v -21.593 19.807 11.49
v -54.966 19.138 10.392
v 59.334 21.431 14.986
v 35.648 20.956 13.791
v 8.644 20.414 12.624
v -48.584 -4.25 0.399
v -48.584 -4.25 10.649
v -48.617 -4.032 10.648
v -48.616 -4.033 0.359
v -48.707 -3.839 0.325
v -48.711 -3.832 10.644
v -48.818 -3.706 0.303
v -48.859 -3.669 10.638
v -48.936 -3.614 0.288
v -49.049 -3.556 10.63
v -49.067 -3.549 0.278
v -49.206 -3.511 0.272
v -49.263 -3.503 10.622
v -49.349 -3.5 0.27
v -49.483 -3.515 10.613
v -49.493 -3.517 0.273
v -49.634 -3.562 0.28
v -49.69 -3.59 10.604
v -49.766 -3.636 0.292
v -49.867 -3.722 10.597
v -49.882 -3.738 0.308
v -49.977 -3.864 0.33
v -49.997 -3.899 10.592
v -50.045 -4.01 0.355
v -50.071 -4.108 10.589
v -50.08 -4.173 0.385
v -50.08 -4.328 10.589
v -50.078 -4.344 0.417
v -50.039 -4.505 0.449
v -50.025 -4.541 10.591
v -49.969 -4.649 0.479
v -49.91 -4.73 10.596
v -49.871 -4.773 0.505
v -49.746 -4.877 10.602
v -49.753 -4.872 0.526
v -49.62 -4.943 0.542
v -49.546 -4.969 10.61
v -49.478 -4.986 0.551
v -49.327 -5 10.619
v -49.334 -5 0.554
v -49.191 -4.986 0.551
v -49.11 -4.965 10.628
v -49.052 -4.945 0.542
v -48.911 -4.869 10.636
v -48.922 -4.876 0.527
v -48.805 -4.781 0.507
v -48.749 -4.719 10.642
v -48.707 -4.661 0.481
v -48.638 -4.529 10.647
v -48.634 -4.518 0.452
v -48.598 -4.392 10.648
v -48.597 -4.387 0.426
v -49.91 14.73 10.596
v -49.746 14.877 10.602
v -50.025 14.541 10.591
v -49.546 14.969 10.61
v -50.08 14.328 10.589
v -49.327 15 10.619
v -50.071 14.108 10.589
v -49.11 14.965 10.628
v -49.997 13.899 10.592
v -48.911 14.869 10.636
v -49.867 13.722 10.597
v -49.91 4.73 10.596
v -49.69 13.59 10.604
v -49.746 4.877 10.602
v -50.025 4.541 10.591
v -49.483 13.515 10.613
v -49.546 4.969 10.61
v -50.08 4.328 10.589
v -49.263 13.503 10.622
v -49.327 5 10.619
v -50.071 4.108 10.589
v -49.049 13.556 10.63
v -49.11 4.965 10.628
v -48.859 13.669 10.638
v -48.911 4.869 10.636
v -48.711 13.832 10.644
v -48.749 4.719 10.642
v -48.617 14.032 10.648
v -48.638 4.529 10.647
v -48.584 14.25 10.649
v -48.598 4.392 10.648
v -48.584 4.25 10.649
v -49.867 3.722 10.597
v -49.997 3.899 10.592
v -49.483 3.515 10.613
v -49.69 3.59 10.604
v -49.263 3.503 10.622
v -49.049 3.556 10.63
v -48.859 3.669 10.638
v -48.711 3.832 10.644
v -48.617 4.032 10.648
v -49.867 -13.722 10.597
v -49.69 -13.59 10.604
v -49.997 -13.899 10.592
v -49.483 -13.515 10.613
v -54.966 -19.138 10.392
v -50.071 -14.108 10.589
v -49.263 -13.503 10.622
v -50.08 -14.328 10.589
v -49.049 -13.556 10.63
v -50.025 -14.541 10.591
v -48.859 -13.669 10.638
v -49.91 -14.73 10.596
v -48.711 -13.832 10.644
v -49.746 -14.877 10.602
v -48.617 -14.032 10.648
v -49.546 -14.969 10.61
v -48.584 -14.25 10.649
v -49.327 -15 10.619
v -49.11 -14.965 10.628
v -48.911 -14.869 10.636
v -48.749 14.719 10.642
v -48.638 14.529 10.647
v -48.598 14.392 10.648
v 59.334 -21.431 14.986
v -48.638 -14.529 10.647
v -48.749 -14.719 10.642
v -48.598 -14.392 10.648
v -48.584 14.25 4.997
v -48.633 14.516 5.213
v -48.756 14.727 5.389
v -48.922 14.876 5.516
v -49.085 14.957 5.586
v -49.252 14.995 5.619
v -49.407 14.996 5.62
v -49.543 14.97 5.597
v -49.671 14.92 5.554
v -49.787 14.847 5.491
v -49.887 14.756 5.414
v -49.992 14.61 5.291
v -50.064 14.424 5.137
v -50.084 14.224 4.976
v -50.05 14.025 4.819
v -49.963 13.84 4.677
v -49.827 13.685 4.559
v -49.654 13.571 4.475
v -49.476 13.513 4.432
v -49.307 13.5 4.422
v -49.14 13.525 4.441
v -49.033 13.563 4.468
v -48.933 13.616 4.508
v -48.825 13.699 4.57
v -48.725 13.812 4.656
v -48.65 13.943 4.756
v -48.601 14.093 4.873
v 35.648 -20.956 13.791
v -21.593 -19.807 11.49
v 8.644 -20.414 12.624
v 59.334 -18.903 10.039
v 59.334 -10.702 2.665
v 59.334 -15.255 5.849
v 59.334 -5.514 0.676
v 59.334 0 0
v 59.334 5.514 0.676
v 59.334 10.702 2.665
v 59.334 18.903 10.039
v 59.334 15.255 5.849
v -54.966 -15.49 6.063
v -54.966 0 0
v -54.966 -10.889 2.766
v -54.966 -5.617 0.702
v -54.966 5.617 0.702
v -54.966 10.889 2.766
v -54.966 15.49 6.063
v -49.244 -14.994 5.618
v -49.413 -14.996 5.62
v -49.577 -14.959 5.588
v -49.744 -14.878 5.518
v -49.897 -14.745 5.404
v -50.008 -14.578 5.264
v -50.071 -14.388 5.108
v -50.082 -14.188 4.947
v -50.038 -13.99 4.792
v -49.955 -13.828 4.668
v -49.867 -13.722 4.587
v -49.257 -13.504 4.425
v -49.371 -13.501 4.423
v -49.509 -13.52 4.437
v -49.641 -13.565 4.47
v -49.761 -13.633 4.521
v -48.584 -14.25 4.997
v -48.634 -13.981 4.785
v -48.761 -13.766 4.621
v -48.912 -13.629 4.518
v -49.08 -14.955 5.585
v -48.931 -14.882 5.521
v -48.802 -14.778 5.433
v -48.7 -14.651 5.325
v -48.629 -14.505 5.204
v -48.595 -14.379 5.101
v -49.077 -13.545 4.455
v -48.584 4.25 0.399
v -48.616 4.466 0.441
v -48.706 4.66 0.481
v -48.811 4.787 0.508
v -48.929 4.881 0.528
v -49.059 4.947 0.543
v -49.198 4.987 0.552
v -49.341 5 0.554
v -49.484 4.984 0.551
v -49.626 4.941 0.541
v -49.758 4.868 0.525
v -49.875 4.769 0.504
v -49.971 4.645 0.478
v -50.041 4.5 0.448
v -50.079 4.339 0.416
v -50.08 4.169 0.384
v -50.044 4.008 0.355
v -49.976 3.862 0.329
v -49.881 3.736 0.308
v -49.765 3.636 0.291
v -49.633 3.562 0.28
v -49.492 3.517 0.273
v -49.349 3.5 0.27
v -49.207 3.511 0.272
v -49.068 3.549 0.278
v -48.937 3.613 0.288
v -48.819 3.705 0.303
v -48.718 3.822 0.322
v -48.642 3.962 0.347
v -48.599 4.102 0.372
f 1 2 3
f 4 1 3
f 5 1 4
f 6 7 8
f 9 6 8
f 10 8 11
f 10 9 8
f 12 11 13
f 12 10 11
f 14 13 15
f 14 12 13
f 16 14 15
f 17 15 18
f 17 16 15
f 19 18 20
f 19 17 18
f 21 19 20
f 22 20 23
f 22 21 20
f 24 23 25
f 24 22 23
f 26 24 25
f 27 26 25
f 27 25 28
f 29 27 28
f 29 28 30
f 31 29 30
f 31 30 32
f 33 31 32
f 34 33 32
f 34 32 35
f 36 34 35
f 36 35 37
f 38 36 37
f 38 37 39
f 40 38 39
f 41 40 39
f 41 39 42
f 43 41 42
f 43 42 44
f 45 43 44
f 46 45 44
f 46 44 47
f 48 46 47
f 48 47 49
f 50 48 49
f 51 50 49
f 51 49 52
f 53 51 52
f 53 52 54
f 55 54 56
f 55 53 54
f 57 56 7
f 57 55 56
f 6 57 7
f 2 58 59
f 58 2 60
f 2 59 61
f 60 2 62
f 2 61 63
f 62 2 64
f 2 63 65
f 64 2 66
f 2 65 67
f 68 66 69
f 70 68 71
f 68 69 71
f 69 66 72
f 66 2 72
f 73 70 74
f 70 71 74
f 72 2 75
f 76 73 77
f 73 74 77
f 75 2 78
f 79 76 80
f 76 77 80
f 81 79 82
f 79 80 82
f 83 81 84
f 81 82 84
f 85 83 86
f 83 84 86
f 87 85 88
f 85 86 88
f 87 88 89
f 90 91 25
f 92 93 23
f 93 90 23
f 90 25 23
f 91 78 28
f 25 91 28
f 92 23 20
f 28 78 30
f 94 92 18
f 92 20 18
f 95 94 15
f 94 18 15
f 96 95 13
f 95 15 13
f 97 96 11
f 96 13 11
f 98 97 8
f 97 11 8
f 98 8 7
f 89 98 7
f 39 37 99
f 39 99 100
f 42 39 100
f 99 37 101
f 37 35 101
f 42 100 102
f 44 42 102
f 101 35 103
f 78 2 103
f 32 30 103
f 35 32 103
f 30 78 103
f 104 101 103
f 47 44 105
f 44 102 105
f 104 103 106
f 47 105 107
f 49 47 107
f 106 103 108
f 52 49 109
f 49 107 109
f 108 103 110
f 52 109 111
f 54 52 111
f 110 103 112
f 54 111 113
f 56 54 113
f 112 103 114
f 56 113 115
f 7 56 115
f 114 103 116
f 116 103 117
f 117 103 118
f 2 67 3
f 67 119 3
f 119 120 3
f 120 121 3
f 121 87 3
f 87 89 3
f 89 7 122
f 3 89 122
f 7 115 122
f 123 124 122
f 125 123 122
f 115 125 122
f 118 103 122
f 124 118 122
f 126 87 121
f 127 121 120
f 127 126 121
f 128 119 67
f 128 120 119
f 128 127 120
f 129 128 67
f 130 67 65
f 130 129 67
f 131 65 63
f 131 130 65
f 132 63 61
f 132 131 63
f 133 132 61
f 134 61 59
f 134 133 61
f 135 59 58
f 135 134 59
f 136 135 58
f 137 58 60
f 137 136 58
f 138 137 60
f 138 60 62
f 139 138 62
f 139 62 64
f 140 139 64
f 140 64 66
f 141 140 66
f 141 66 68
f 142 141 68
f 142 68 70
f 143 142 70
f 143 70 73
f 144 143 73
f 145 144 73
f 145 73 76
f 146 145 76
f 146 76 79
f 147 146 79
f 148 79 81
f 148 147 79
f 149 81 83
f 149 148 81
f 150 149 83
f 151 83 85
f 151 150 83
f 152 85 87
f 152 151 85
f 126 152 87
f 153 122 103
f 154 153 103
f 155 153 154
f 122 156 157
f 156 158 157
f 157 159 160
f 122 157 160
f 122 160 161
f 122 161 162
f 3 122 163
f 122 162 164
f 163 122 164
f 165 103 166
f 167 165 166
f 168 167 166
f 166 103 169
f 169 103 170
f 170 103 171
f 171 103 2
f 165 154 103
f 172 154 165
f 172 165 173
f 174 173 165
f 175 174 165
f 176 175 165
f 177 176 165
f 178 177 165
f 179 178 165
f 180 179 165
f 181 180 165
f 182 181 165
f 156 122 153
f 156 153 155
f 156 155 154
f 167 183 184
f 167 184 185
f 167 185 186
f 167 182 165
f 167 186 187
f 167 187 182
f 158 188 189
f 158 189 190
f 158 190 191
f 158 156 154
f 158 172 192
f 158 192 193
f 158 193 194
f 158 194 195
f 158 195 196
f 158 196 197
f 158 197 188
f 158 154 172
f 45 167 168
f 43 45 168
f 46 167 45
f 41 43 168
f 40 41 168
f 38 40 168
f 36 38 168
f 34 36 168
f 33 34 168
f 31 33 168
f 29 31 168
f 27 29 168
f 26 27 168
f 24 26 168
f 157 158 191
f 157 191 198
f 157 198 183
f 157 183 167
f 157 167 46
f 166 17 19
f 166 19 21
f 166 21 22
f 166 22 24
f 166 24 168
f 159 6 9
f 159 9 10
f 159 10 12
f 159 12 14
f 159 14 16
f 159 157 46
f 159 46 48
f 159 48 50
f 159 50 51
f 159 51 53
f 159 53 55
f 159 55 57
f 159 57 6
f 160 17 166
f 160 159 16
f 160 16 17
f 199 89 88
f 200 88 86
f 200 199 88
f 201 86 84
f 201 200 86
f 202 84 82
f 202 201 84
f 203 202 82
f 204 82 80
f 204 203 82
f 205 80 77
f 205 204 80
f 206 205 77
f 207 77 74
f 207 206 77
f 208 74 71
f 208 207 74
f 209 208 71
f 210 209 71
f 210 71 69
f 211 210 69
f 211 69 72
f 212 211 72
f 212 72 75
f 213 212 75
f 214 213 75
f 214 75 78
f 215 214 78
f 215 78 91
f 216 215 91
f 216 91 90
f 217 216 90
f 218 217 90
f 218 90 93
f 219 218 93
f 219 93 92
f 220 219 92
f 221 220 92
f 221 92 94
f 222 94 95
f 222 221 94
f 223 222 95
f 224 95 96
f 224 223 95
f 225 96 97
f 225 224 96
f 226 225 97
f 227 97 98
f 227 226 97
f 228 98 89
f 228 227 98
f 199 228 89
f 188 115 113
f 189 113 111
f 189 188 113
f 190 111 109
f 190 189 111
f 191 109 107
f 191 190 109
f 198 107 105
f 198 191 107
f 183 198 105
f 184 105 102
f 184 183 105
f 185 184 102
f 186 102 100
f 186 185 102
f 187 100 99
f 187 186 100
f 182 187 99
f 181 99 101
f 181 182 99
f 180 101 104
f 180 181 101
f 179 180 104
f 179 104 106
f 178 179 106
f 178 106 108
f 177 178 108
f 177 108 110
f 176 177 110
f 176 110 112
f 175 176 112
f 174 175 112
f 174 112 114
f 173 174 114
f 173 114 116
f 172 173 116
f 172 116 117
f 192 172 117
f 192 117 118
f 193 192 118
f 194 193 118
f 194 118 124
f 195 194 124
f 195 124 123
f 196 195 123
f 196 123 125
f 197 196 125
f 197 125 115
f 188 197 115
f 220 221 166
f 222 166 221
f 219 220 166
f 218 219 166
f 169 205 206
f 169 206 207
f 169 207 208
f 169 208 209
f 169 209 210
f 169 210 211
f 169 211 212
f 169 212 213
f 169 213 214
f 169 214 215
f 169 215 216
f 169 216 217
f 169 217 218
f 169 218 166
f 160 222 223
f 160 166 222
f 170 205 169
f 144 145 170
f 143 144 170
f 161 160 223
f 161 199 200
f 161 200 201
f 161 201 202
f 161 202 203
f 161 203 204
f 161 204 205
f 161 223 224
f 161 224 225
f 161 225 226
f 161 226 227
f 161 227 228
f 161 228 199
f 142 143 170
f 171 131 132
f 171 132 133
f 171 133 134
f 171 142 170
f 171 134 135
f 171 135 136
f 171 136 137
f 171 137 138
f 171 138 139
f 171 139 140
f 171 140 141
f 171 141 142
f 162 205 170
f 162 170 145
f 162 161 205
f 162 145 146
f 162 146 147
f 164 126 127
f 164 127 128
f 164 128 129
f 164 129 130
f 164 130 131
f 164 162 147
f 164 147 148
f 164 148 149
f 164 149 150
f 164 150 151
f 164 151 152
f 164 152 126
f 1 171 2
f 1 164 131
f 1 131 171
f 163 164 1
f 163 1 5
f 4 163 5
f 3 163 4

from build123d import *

# Parameters (mm, degrees)
F0_R          = 0.75
F1_DEPTH      = 14.986
F3_DEPTH      = 114.3
F5_DEPTH      = 25.4
F5_DEPTH_BACK = 25.4


# Not quite as in the source:
# - a feature names something its author has since deleted; it is built from what else it names


with BuildPart() as f1:
    # F0 (on Top) → F1 (new body)
    with BuildSketch(Plane.XY):
        Polygon((59.3341242821, 21.43125), (-59.3341242821, 19.05), (-59.3341242821, -19.05), (59.3341242821, -21.43125), align=None)
        with Locations((-49.3341242821, -14.2496579055)):
            Circle(F0_R, mode=Mode.SUBTRACT)
        with Locations((-49.3341242821, -4.2496579055)):
            Circle(F0_R, mode=Mode.SUBTRACT)
        with Locations((-49.3341242821, 4.2496579055)):
            Circle(F0_R, mode=Mode.SUBTRACT)
        with Locations((-49.3341242821, 14.2496579055)):
            Circle(F0_R, mode=Mode.SUBTRACT)
    extrude(amount=F1_DEPTH)

    # F2 (on face) → F3 (intersect)
    with BuildSketch(Plane.YZ.offset(59.3341242821)):
        with BuildLine():
            Line((21.43125, 14.986), (-21.43125, 14.986))
            ThreePointArc((-21.43125, 14.986), (-13.0755370179, 4.1181258353), (-1.54e-08, 0))
            ThreePointArc((-1.54e-08, 0), (13.0755370052, 4.1181258265), (21.43125, 14.986))
        make_face()
    extrude(amount=-F3_DEPTH, mode=Mode.INTERSECT)

    # F4 (on Front) → F5 (cut, two sides)
    with BuildSketch(Plane.XZ) as f5_sk:
        Polygon((-54.9658757179, 14.986), (-54.9658757179, 10.3923923096), (59.3341242821, 14.986), align=None)
    extrude(amount=-F5_DEPTH, mode=Mode.SUBTRACT)
    extrude(f5_sk.sketch, amount=F5_DEPTH_BACK, mode=Mode.SUBTRACT)


solid = f1.part
